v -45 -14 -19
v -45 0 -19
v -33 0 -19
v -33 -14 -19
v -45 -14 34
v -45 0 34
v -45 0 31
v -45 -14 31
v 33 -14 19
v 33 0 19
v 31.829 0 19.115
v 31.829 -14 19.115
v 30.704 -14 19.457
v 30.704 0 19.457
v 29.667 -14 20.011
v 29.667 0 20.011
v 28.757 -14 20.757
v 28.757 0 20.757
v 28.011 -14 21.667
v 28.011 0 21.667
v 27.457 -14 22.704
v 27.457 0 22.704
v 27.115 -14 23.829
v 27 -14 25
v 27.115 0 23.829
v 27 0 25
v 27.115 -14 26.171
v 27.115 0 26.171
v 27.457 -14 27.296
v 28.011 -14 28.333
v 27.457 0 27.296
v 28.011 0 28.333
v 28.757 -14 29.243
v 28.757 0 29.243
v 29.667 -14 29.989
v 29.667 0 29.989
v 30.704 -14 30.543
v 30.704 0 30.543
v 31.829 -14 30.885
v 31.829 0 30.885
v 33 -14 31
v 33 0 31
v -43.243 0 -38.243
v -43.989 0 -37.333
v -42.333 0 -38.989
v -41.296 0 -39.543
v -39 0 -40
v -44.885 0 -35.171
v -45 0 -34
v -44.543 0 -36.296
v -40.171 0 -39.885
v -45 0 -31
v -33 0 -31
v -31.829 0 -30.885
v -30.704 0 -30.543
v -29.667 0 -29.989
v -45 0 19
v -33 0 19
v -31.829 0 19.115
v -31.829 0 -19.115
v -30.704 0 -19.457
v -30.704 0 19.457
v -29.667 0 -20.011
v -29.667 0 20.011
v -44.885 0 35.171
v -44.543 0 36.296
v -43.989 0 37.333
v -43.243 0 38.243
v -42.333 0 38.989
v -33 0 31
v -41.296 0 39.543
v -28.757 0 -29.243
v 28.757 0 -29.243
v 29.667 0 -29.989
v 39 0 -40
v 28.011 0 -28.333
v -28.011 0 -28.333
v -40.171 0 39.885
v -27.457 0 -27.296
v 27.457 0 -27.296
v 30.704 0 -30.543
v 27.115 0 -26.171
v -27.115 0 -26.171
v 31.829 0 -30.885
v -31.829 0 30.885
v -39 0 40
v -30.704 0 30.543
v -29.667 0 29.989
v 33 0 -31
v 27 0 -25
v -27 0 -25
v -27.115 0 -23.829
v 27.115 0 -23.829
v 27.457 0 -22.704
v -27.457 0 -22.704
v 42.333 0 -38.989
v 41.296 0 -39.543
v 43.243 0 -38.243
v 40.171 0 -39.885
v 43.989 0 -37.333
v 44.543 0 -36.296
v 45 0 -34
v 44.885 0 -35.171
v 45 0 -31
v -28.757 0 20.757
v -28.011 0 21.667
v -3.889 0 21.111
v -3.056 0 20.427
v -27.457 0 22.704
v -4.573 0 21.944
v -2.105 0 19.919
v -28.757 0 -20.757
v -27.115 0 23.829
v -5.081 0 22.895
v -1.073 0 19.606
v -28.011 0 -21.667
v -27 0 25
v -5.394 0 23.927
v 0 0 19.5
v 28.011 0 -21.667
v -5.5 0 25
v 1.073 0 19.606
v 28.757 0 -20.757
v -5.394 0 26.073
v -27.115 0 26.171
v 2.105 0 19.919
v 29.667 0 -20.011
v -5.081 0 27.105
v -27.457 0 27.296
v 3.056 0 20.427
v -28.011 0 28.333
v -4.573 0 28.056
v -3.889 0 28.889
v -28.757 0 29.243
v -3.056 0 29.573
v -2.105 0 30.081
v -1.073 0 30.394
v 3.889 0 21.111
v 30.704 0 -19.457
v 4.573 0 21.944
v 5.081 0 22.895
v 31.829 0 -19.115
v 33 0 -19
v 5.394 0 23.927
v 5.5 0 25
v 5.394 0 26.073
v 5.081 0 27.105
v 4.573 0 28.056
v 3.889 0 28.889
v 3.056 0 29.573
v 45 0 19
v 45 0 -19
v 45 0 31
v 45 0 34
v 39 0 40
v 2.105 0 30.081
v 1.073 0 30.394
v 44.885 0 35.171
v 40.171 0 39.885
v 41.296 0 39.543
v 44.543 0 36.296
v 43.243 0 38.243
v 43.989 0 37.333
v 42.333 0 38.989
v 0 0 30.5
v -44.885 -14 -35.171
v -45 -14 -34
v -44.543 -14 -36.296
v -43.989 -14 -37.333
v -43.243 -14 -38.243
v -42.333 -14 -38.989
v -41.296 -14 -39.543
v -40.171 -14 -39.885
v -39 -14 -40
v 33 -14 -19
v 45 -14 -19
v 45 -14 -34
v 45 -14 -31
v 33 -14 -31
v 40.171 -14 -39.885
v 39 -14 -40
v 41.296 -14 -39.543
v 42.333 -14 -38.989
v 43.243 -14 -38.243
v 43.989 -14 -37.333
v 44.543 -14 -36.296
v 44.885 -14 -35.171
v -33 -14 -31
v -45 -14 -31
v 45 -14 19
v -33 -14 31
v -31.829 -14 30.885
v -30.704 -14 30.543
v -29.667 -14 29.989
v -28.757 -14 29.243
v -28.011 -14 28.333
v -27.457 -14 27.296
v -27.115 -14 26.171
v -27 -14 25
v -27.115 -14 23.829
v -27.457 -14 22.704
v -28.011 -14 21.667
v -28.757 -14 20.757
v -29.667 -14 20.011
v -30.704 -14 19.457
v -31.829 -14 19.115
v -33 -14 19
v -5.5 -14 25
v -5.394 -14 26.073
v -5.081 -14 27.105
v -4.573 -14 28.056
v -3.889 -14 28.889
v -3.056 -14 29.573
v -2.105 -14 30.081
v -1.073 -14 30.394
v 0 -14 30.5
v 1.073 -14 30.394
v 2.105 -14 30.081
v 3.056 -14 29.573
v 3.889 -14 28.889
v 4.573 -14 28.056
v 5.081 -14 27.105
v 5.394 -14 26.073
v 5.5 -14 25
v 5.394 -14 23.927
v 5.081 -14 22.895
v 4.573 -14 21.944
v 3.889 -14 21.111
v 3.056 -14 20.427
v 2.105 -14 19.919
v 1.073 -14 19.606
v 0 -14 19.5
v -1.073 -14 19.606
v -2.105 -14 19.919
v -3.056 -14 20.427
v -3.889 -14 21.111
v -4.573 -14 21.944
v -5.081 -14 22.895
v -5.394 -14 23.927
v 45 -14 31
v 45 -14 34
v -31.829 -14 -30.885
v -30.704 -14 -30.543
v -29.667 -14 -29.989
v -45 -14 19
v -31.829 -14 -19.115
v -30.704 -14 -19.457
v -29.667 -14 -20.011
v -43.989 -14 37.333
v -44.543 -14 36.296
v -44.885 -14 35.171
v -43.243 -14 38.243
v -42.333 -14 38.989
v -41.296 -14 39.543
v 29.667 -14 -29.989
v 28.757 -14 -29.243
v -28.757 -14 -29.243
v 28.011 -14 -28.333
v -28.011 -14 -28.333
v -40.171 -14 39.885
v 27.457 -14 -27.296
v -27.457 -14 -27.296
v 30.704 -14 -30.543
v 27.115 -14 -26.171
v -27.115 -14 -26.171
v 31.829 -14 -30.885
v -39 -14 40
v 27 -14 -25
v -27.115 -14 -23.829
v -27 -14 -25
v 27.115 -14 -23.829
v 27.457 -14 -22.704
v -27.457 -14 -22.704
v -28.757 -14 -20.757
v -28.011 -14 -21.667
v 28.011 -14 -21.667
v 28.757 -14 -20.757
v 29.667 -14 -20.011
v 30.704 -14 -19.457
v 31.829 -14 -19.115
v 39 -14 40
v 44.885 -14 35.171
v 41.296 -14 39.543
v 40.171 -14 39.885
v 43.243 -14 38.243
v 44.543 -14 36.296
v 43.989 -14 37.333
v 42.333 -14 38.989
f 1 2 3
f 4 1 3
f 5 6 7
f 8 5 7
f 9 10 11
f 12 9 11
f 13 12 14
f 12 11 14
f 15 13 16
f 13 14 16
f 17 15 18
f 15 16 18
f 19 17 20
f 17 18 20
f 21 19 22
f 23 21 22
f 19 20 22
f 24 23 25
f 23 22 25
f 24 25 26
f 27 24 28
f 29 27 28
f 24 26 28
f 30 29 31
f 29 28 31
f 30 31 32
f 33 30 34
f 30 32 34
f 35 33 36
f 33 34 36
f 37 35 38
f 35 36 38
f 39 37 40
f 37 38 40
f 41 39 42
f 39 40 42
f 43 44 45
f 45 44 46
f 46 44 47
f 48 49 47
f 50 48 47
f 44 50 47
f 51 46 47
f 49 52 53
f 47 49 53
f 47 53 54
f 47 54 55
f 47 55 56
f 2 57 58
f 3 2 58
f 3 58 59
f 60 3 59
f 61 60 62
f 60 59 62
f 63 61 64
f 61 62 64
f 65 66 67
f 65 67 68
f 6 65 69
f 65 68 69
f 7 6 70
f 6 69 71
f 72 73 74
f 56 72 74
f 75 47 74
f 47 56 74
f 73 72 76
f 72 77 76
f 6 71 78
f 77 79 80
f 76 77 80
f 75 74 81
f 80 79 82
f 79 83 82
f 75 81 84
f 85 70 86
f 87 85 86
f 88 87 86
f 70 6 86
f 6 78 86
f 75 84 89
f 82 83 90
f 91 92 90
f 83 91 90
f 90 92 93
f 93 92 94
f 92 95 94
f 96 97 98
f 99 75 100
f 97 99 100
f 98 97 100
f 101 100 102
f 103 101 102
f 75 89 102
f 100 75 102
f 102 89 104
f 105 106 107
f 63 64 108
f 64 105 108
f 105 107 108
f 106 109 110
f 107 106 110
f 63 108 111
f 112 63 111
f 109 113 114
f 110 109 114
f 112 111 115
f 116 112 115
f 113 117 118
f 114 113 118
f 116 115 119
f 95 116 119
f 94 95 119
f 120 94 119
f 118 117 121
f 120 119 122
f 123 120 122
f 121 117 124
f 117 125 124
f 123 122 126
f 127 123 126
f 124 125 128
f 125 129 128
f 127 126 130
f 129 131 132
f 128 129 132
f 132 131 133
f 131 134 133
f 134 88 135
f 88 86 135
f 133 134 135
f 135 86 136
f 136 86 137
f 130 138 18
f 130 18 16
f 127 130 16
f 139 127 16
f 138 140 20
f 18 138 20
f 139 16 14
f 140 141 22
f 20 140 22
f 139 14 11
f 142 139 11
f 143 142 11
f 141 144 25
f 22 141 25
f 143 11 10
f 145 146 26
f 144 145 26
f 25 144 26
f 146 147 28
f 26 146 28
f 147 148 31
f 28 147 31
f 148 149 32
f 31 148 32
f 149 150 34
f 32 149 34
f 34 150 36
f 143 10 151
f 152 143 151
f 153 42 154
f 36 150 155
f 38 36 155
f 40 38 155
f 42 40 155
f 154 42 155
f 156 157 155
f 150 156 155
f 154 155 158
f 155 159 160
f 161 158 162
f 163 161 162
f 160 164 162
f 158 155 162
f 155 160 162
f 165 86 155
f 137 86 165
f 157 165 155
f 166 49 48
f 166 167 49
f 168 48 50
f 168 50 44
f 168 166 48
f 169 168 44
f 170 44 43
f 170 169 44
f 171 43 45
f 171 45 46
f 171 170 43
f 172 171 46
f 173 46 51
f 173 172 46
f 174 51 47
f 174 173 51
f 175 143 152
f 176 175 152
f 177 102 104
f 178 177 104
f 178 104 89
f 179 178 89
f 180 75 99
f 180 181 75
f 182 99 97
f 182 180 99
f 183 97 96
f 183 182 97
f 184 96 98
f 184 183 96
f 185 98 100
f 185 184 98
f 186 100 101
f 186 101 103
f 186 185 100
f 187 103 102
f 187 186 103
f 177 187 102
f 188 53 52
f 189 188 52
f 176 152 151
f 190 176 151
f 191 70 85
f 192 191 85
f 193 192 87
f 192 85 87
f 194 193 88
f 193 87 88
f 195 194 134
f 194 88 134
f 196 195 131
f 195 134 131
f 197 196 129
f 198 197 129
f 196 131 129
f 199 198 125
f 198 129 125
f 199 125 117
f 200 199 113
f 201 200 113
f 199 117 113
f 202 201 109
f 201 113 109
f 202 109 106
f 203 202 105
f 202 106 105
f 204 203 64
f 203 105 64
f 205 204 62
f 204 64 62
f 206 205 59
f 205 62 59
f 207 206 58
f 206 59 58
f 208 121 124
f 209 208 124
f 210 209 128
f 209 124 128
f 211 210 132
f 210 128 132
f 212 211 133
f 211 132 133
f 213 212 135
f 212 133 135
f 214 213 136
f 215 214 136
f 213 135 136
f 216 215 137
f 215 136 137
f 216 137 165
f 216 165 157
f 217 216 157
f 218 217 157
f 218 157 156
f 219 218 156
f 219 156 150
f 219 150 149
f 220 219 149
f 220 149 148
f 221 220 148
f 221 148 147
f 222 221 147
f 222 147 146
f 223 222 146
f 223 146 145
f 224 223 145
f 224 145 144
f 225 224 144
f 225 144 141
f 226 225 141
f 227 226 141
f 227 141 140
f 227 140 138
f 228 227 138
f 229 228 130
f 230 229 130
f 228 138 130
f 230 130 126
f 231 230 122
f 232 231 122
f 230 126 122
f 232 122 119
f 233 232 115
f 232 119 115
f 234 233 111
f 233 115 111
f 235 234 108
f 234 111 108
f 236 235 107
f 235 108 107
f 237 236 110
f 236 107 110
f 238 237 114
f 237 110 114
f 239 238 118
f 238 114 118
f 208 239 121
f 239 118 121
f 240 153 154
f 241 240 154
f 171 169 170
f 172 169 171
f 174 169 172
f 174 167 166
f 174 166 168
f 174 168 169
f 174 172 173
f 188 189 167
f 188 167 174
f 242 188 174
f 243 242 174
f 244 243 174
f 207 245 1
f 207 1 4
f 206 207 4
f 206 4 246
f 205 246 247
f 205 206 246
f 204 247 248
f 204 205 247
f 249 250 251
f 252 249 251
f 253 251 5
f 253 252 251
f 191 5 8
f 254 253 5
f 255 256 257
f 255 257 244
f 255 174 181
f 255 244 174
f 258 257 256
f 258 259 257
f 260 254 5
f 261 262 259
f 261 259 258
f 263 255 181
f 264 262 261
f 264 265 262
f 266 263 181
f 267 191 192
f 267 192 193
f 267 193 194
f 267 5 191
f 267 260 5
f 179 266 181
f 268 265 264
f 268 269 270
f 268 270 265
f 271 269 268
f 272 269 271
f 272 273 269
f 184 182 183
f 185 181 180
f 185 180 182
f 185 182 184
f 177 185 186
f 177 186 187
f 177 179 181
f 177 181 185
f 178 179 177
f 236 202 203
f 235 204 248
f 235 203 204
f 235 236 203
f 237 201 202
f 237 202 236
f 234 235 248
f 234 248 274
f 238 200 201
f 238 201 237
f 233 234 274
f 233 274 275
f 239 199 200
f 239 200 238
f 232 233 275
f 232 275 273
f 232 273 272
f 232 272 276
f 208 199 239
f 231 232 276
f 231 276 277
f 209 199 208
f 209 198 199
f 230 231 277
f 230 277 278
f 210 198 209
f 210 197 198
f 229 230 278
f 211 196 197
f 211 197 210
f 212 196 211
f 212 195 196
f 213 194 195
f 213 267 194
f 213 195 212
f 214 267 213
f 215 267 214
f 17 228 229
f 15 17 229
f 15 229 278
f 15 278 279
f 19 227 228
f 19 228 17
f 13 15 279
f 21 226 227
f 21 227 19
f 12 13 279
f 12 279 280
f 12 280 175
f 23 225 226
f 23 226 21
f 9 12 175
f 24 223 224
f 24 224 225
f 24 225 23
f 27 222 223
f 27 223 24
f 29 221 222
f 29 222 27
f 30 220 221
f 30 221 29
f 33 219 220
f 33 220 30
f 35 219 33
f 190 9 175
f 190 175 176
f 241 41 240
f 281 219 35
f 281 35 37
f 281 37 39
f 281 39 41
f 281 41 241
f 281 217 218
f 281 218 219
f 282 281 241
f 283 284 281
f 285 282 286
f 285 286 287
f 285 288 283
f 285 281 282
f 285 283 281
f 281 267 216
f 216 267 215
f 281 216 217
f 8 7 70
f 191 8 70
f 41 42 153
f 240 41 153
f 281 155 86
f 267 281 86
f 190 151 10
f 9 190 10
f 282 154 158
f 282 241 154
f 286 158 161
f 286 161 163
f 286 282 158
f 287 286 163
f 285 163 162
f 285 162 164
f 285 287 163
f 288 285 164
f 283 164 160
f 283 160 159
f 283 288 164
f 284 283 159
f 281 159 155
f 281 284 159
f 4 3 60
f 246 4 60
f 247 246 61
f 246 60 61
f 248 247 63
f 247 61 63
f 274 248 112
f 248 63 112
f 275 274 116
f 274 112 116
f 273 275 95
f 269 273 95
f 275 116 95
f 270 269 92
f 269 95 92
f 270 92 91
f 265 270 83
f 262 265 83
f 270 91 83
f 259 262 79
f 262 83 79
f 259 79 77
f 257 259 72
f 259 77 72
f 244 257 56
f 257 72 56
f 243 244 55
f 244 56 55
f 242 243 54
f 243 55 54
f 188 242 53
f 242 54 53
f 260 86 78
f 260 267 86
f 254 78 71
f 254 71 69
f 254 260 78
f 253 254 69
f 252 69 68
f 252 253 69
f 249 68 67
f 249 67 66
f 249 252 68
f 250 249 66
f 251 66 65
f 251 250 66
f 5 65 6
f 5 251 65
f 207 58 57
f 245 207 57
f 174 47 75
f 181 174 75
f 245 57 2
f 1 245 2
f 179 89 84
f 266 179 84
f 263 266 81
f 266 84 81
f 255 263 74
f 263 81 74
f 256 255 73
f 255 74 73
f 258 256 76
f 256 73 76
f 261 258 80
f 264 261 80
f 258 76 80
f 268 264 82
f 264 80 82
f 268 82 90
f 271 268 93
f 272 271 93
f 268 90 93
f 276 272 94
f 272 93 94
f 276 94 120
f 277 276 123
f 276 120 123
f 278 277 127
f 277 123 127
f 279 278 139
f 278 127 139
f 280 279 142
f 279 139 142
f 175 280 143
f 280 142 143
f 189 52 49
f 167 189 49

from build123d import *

# Parameters (mm, degrees)
F1_DEPTH = 14
F2_R     = 6
F4_D     = 11


with BuildPart() as f1:
    # F0 (on Front) → F1 (new body)
    with BuildSketch(Plane.XZ):
        with BuildLine():
            Line((45, 31), (45, 40))
            Line((45, 40), (-45, 40))
            Line((-45, 40), (-45, 31))
            Line((-45, 31), (-33, 31))
            ThreePointArc((-33, 31), (-27, 25), (-33, 19))
            Line((-33, 19), (-45, 19))
            Line((-45, 19), (-45, -19))
            Line((-45, -19), (-33, -19))
            ThreePointArc((-33, -19), (-27, -25), (-33, -31))
            Line((-33, -31), (-45, -31))
            Line((-45, -31), (-45, -40))
            Line((-45, -40), (45, -40))
            Line((45, -40), (45, -31))
            Line((45, -31), (33, -31))
            ThreePointArc((33, -31), (27, -25), (33, -19))
            Line((33, -19), (45, -19))
            Line((45, -19), (45, 19))
            Line((45, 19), (33, 19))
            ThreePointArc((33, 19), (27, 25), (33, 31))
            Line((33, 31), (45, 31))
        make_face()
    extrude(amount=F1_DEPTH)

    # F2
    f2_edges = [f1.edges().sort_by_distance(p)[0] for p in [
        (-45, -7, 40),
        (-45, -7, -40),
        (45, -7, 40),
        (45, -7, -40),
    ]]
    fillet(f2_edges, radius=F2_R)

    # F4 (through all)
    with Locations(Plane.XZ.offset(14)):
        with Locations((0, 25)):
            Hole(F4_D / 2)


solid = f1.part
